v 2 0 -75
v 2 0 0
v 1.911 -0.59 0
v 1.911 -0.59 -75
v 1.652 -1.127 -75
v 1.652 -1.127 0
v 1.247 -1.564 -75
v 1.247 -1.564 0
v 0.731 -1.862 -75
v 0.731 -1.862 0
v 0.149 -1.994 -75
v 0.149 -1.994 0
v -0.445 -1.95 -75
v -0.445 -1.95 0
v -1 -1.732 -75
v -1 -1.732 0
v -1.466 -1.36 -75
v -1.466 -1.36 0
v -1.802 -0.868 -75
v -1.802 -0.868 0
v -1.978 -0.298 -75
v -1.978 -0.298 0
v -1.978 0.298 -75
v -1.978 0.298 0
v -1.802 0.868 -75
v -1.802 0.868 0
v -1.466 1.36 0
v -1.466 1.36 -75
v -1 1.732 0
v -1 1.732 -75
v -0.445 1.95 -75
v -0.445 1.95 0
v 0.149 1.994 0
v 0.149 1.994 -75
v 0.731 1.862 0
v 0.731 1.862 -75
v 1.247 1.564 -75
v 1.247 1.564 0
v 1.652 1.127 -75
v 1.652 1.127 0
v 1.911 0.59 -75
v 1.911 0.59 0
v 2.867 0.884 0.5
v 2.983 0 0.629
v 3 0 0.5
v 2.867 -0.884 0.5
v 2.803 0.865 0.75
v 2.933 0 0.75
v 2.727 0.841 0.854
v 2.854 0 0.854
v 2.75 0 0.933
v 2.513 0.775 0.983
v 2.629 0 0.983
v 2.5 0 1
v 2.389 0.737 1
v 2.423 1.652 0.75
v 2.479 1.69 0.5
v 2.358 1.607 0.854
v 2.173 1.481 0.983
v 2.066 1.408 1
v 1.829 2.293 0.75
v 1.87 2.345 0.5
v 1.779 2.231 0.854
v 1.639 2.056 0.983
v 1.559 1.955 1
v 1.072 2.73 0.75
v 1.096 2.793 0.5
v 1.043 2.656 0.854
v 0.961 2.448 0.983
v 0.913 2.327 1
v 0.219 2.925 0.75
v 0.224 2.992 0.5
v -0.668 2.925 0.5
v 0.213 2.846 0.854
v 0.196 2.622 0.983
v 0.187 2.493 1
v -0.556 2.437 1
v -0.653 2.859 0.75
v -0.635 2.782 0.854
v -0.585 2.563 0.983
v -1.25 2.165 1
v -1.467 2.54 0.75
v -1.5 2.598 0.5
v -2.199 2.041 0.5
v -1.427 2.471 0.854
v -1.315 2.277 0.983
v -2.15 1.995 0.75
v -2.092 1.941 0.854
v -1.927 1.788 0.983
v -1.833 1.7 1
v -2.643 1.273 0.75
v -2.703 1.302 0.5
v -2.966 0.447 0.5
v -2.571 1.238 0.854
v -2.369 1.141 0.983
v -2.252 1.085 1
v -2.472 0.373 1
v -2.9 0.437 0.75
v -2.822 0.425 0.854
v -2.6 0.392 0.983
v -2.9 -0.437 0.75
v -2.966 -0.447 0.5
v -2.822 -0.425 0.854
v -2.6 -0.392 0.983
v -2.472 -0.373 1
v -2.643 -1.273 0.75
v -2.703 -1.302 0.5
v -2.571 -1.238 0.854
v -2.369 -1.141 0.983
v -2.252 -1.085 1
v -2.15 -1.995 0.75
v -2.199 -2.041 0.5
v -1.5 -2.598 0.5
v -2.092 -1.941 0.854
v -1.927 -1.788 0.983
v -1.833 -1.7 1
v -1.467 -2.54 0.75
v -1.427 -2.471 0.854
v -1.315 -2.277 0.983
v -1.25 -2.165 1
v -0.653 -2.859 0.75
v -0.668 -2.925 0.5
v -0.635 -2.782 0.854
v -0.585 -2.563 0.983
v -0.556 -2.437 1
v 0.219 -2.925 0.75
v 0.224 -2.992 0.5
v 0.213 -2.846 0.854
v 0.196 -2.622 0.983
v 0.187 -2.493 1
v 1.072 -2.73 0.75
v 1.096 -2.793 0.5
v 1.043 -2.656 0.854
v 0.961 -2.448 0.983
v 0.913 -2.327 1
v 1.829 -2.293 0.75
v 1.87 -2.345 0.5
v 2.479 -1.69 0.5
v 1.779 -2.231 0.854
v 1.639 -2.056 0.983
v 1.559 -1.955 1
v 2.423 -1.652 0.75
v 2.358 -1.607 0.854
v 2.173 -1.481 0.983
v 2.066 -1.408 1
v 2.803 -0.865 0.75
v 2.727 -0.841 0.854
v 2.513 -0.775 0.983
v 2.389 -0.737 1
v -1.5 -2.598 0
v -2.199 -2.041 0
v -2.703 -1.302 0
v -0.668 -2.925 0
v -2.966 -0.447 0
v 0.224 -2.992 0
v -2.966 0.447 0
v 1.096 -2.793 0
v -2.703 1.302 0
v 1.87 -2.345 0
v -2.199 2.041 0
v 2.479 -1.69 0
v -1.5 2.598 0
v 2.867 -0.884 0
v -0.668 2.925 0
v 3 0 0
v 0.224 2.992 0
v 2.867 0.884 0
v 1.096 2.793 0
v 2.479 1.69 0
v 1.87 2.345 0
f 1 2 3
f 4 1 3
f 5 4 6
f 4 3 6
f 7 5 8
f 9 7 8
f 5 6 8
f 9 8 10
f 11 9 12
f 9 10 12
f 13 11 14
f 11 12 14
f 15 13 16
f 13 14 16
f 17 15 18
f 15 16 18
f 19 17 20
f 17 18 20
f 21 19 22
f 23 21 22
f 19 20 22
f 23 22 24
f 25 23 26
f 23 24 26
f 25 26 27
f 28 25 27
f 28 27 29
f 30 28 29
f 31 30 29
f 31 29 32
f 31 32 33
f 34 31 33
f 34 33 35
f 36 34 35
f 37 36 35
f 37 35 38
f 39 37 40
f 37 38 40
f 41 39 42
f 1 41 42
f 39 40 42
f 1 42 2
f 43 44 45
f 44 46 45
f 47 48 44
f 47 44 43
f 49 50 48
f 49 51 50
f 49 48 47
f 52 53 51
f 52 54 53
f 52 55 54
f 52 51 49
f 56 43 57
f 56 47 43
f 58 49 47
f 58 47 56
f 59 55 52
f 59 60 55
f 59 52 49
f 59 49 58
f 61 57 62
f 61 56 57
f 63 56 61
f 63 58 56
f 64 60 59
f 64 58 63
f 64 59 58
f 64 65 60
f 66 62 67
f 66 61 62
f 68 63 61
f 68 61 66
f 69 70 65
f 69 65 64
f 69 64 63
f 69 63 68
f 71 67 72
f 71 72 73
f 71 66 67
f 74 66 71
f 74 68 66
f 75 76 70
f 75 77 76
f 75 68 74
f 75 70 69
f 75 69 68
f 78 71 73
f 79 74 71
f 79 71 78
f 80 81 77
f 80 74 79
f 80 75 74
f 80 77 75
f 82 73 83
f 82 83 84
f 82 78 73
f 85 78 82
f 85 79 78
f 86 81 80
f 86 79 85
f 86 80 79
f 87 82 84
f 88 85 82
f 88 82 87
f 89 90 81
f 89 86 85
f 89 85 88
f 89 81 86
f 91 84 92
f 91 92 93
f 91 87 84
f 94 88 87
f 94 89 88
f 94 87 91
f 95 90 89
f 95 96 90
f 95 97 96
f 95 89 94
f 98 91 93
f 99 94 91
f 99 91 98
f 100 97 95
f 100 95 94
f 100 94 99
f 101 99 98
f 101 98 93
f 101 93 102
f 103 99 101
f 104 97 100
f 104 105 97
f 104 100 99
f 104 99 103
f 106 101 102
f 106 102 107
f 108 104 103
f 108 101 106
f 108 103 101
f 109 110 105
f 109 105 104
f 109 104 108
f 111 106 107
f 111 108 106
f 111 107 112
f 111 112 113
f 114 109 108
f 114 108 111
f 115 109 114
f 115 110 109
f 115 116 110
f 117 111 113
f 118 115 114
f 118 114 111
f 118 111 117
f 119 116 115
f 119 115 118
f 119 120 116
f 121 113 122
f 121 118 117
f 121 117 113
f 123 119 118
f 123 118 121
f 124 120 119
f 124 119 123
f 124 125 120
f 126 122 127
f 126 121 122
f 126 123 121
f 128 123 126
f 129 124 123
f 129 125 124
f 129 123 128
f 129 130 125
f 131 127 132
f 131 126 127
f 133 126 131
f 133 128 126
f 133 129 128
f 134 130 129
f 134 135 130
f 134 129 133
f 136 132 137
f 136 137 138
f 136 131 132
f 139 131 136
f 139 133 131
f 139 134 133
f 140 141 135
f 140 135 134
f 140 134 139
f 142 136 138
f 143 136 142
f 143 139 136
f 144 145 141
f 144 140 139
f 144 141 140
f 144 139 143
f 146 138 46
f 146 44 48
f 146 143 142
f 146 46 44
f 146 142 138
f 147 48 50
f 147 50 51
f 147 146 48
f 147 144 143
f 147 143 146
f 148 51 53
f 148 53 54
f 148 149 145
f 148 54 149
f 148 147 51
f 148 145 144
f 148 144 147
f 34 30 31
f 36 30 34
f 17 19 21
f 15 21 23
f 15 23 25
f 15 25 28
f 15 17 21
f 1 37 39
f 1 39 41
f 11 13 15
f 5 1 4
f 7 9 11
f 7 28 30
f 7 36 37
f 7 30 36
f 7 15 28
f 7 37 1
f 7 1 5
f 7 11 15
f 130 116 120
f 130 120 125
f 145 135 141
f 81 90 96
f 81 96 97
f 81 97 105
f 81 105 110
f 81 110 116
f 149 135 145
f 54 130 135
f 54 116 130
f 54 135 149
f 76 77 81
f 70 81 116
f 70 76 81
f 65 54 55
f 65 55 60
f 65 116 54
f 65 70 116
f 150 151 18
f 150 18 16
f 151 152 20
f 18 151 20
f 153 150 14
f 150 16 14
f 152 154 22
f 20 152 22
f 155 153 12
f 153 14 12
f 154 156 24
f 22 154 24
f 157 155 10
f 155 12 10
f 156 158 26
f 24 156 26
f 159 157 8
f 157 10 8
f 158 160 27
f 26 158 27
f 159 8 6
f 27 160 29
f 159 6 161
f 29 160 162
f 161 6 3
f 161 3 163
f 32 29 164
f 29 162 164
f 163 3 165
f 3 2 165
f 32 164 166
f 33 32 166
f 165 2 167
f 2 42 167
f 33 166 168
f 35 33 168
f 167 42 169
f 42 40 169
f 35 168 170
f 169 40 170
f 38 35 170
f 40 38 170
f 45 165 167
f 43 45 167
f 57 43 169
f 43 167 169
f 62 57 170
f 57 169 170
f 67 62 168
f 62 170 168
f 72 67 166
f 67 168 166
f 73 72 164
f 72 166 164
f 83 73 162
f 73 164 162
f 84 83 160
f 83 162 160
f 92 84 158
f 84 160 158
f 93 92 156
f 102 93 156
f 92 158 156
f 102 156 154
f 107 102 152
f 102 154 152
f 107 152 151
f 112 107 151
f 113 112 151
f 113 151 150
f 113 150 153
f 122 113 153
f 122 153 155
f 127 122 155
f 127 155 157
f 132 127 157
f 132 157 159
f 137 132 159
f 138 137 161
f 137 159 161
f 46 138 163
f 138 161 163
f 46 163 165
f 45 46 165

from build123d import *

# Parameters (mm, degrees)
F0_R     = 3
F1_DEPTH = 1
F2_R     = 0.5
F3_R     = 2
F4_DEPTH = 75


with BuildPart() as f1:
    # F0 (on Top) → F1 (new body)
    with BuildSketch(Plane.XY):
        Circle(F0_R)
    extrude(amount=F1_DEPTH)

    # F2
    f2_edges = [f1.edges().sort_by_distance(p)[0] for p in [
        (-3, 0, 1),
    ]]
    fillet(f2_edges, radius=F2_R)

    # F3 (on face) → F4 (join)
    with BuildSketch(Plane(origin=(0, 0, 0), x_dir=(1, 0, 0), z_dir=(0, 0, -1))):
        Circle(F3_R)
    extrude(amount=F4_DEPTH)


solid = f1.part
